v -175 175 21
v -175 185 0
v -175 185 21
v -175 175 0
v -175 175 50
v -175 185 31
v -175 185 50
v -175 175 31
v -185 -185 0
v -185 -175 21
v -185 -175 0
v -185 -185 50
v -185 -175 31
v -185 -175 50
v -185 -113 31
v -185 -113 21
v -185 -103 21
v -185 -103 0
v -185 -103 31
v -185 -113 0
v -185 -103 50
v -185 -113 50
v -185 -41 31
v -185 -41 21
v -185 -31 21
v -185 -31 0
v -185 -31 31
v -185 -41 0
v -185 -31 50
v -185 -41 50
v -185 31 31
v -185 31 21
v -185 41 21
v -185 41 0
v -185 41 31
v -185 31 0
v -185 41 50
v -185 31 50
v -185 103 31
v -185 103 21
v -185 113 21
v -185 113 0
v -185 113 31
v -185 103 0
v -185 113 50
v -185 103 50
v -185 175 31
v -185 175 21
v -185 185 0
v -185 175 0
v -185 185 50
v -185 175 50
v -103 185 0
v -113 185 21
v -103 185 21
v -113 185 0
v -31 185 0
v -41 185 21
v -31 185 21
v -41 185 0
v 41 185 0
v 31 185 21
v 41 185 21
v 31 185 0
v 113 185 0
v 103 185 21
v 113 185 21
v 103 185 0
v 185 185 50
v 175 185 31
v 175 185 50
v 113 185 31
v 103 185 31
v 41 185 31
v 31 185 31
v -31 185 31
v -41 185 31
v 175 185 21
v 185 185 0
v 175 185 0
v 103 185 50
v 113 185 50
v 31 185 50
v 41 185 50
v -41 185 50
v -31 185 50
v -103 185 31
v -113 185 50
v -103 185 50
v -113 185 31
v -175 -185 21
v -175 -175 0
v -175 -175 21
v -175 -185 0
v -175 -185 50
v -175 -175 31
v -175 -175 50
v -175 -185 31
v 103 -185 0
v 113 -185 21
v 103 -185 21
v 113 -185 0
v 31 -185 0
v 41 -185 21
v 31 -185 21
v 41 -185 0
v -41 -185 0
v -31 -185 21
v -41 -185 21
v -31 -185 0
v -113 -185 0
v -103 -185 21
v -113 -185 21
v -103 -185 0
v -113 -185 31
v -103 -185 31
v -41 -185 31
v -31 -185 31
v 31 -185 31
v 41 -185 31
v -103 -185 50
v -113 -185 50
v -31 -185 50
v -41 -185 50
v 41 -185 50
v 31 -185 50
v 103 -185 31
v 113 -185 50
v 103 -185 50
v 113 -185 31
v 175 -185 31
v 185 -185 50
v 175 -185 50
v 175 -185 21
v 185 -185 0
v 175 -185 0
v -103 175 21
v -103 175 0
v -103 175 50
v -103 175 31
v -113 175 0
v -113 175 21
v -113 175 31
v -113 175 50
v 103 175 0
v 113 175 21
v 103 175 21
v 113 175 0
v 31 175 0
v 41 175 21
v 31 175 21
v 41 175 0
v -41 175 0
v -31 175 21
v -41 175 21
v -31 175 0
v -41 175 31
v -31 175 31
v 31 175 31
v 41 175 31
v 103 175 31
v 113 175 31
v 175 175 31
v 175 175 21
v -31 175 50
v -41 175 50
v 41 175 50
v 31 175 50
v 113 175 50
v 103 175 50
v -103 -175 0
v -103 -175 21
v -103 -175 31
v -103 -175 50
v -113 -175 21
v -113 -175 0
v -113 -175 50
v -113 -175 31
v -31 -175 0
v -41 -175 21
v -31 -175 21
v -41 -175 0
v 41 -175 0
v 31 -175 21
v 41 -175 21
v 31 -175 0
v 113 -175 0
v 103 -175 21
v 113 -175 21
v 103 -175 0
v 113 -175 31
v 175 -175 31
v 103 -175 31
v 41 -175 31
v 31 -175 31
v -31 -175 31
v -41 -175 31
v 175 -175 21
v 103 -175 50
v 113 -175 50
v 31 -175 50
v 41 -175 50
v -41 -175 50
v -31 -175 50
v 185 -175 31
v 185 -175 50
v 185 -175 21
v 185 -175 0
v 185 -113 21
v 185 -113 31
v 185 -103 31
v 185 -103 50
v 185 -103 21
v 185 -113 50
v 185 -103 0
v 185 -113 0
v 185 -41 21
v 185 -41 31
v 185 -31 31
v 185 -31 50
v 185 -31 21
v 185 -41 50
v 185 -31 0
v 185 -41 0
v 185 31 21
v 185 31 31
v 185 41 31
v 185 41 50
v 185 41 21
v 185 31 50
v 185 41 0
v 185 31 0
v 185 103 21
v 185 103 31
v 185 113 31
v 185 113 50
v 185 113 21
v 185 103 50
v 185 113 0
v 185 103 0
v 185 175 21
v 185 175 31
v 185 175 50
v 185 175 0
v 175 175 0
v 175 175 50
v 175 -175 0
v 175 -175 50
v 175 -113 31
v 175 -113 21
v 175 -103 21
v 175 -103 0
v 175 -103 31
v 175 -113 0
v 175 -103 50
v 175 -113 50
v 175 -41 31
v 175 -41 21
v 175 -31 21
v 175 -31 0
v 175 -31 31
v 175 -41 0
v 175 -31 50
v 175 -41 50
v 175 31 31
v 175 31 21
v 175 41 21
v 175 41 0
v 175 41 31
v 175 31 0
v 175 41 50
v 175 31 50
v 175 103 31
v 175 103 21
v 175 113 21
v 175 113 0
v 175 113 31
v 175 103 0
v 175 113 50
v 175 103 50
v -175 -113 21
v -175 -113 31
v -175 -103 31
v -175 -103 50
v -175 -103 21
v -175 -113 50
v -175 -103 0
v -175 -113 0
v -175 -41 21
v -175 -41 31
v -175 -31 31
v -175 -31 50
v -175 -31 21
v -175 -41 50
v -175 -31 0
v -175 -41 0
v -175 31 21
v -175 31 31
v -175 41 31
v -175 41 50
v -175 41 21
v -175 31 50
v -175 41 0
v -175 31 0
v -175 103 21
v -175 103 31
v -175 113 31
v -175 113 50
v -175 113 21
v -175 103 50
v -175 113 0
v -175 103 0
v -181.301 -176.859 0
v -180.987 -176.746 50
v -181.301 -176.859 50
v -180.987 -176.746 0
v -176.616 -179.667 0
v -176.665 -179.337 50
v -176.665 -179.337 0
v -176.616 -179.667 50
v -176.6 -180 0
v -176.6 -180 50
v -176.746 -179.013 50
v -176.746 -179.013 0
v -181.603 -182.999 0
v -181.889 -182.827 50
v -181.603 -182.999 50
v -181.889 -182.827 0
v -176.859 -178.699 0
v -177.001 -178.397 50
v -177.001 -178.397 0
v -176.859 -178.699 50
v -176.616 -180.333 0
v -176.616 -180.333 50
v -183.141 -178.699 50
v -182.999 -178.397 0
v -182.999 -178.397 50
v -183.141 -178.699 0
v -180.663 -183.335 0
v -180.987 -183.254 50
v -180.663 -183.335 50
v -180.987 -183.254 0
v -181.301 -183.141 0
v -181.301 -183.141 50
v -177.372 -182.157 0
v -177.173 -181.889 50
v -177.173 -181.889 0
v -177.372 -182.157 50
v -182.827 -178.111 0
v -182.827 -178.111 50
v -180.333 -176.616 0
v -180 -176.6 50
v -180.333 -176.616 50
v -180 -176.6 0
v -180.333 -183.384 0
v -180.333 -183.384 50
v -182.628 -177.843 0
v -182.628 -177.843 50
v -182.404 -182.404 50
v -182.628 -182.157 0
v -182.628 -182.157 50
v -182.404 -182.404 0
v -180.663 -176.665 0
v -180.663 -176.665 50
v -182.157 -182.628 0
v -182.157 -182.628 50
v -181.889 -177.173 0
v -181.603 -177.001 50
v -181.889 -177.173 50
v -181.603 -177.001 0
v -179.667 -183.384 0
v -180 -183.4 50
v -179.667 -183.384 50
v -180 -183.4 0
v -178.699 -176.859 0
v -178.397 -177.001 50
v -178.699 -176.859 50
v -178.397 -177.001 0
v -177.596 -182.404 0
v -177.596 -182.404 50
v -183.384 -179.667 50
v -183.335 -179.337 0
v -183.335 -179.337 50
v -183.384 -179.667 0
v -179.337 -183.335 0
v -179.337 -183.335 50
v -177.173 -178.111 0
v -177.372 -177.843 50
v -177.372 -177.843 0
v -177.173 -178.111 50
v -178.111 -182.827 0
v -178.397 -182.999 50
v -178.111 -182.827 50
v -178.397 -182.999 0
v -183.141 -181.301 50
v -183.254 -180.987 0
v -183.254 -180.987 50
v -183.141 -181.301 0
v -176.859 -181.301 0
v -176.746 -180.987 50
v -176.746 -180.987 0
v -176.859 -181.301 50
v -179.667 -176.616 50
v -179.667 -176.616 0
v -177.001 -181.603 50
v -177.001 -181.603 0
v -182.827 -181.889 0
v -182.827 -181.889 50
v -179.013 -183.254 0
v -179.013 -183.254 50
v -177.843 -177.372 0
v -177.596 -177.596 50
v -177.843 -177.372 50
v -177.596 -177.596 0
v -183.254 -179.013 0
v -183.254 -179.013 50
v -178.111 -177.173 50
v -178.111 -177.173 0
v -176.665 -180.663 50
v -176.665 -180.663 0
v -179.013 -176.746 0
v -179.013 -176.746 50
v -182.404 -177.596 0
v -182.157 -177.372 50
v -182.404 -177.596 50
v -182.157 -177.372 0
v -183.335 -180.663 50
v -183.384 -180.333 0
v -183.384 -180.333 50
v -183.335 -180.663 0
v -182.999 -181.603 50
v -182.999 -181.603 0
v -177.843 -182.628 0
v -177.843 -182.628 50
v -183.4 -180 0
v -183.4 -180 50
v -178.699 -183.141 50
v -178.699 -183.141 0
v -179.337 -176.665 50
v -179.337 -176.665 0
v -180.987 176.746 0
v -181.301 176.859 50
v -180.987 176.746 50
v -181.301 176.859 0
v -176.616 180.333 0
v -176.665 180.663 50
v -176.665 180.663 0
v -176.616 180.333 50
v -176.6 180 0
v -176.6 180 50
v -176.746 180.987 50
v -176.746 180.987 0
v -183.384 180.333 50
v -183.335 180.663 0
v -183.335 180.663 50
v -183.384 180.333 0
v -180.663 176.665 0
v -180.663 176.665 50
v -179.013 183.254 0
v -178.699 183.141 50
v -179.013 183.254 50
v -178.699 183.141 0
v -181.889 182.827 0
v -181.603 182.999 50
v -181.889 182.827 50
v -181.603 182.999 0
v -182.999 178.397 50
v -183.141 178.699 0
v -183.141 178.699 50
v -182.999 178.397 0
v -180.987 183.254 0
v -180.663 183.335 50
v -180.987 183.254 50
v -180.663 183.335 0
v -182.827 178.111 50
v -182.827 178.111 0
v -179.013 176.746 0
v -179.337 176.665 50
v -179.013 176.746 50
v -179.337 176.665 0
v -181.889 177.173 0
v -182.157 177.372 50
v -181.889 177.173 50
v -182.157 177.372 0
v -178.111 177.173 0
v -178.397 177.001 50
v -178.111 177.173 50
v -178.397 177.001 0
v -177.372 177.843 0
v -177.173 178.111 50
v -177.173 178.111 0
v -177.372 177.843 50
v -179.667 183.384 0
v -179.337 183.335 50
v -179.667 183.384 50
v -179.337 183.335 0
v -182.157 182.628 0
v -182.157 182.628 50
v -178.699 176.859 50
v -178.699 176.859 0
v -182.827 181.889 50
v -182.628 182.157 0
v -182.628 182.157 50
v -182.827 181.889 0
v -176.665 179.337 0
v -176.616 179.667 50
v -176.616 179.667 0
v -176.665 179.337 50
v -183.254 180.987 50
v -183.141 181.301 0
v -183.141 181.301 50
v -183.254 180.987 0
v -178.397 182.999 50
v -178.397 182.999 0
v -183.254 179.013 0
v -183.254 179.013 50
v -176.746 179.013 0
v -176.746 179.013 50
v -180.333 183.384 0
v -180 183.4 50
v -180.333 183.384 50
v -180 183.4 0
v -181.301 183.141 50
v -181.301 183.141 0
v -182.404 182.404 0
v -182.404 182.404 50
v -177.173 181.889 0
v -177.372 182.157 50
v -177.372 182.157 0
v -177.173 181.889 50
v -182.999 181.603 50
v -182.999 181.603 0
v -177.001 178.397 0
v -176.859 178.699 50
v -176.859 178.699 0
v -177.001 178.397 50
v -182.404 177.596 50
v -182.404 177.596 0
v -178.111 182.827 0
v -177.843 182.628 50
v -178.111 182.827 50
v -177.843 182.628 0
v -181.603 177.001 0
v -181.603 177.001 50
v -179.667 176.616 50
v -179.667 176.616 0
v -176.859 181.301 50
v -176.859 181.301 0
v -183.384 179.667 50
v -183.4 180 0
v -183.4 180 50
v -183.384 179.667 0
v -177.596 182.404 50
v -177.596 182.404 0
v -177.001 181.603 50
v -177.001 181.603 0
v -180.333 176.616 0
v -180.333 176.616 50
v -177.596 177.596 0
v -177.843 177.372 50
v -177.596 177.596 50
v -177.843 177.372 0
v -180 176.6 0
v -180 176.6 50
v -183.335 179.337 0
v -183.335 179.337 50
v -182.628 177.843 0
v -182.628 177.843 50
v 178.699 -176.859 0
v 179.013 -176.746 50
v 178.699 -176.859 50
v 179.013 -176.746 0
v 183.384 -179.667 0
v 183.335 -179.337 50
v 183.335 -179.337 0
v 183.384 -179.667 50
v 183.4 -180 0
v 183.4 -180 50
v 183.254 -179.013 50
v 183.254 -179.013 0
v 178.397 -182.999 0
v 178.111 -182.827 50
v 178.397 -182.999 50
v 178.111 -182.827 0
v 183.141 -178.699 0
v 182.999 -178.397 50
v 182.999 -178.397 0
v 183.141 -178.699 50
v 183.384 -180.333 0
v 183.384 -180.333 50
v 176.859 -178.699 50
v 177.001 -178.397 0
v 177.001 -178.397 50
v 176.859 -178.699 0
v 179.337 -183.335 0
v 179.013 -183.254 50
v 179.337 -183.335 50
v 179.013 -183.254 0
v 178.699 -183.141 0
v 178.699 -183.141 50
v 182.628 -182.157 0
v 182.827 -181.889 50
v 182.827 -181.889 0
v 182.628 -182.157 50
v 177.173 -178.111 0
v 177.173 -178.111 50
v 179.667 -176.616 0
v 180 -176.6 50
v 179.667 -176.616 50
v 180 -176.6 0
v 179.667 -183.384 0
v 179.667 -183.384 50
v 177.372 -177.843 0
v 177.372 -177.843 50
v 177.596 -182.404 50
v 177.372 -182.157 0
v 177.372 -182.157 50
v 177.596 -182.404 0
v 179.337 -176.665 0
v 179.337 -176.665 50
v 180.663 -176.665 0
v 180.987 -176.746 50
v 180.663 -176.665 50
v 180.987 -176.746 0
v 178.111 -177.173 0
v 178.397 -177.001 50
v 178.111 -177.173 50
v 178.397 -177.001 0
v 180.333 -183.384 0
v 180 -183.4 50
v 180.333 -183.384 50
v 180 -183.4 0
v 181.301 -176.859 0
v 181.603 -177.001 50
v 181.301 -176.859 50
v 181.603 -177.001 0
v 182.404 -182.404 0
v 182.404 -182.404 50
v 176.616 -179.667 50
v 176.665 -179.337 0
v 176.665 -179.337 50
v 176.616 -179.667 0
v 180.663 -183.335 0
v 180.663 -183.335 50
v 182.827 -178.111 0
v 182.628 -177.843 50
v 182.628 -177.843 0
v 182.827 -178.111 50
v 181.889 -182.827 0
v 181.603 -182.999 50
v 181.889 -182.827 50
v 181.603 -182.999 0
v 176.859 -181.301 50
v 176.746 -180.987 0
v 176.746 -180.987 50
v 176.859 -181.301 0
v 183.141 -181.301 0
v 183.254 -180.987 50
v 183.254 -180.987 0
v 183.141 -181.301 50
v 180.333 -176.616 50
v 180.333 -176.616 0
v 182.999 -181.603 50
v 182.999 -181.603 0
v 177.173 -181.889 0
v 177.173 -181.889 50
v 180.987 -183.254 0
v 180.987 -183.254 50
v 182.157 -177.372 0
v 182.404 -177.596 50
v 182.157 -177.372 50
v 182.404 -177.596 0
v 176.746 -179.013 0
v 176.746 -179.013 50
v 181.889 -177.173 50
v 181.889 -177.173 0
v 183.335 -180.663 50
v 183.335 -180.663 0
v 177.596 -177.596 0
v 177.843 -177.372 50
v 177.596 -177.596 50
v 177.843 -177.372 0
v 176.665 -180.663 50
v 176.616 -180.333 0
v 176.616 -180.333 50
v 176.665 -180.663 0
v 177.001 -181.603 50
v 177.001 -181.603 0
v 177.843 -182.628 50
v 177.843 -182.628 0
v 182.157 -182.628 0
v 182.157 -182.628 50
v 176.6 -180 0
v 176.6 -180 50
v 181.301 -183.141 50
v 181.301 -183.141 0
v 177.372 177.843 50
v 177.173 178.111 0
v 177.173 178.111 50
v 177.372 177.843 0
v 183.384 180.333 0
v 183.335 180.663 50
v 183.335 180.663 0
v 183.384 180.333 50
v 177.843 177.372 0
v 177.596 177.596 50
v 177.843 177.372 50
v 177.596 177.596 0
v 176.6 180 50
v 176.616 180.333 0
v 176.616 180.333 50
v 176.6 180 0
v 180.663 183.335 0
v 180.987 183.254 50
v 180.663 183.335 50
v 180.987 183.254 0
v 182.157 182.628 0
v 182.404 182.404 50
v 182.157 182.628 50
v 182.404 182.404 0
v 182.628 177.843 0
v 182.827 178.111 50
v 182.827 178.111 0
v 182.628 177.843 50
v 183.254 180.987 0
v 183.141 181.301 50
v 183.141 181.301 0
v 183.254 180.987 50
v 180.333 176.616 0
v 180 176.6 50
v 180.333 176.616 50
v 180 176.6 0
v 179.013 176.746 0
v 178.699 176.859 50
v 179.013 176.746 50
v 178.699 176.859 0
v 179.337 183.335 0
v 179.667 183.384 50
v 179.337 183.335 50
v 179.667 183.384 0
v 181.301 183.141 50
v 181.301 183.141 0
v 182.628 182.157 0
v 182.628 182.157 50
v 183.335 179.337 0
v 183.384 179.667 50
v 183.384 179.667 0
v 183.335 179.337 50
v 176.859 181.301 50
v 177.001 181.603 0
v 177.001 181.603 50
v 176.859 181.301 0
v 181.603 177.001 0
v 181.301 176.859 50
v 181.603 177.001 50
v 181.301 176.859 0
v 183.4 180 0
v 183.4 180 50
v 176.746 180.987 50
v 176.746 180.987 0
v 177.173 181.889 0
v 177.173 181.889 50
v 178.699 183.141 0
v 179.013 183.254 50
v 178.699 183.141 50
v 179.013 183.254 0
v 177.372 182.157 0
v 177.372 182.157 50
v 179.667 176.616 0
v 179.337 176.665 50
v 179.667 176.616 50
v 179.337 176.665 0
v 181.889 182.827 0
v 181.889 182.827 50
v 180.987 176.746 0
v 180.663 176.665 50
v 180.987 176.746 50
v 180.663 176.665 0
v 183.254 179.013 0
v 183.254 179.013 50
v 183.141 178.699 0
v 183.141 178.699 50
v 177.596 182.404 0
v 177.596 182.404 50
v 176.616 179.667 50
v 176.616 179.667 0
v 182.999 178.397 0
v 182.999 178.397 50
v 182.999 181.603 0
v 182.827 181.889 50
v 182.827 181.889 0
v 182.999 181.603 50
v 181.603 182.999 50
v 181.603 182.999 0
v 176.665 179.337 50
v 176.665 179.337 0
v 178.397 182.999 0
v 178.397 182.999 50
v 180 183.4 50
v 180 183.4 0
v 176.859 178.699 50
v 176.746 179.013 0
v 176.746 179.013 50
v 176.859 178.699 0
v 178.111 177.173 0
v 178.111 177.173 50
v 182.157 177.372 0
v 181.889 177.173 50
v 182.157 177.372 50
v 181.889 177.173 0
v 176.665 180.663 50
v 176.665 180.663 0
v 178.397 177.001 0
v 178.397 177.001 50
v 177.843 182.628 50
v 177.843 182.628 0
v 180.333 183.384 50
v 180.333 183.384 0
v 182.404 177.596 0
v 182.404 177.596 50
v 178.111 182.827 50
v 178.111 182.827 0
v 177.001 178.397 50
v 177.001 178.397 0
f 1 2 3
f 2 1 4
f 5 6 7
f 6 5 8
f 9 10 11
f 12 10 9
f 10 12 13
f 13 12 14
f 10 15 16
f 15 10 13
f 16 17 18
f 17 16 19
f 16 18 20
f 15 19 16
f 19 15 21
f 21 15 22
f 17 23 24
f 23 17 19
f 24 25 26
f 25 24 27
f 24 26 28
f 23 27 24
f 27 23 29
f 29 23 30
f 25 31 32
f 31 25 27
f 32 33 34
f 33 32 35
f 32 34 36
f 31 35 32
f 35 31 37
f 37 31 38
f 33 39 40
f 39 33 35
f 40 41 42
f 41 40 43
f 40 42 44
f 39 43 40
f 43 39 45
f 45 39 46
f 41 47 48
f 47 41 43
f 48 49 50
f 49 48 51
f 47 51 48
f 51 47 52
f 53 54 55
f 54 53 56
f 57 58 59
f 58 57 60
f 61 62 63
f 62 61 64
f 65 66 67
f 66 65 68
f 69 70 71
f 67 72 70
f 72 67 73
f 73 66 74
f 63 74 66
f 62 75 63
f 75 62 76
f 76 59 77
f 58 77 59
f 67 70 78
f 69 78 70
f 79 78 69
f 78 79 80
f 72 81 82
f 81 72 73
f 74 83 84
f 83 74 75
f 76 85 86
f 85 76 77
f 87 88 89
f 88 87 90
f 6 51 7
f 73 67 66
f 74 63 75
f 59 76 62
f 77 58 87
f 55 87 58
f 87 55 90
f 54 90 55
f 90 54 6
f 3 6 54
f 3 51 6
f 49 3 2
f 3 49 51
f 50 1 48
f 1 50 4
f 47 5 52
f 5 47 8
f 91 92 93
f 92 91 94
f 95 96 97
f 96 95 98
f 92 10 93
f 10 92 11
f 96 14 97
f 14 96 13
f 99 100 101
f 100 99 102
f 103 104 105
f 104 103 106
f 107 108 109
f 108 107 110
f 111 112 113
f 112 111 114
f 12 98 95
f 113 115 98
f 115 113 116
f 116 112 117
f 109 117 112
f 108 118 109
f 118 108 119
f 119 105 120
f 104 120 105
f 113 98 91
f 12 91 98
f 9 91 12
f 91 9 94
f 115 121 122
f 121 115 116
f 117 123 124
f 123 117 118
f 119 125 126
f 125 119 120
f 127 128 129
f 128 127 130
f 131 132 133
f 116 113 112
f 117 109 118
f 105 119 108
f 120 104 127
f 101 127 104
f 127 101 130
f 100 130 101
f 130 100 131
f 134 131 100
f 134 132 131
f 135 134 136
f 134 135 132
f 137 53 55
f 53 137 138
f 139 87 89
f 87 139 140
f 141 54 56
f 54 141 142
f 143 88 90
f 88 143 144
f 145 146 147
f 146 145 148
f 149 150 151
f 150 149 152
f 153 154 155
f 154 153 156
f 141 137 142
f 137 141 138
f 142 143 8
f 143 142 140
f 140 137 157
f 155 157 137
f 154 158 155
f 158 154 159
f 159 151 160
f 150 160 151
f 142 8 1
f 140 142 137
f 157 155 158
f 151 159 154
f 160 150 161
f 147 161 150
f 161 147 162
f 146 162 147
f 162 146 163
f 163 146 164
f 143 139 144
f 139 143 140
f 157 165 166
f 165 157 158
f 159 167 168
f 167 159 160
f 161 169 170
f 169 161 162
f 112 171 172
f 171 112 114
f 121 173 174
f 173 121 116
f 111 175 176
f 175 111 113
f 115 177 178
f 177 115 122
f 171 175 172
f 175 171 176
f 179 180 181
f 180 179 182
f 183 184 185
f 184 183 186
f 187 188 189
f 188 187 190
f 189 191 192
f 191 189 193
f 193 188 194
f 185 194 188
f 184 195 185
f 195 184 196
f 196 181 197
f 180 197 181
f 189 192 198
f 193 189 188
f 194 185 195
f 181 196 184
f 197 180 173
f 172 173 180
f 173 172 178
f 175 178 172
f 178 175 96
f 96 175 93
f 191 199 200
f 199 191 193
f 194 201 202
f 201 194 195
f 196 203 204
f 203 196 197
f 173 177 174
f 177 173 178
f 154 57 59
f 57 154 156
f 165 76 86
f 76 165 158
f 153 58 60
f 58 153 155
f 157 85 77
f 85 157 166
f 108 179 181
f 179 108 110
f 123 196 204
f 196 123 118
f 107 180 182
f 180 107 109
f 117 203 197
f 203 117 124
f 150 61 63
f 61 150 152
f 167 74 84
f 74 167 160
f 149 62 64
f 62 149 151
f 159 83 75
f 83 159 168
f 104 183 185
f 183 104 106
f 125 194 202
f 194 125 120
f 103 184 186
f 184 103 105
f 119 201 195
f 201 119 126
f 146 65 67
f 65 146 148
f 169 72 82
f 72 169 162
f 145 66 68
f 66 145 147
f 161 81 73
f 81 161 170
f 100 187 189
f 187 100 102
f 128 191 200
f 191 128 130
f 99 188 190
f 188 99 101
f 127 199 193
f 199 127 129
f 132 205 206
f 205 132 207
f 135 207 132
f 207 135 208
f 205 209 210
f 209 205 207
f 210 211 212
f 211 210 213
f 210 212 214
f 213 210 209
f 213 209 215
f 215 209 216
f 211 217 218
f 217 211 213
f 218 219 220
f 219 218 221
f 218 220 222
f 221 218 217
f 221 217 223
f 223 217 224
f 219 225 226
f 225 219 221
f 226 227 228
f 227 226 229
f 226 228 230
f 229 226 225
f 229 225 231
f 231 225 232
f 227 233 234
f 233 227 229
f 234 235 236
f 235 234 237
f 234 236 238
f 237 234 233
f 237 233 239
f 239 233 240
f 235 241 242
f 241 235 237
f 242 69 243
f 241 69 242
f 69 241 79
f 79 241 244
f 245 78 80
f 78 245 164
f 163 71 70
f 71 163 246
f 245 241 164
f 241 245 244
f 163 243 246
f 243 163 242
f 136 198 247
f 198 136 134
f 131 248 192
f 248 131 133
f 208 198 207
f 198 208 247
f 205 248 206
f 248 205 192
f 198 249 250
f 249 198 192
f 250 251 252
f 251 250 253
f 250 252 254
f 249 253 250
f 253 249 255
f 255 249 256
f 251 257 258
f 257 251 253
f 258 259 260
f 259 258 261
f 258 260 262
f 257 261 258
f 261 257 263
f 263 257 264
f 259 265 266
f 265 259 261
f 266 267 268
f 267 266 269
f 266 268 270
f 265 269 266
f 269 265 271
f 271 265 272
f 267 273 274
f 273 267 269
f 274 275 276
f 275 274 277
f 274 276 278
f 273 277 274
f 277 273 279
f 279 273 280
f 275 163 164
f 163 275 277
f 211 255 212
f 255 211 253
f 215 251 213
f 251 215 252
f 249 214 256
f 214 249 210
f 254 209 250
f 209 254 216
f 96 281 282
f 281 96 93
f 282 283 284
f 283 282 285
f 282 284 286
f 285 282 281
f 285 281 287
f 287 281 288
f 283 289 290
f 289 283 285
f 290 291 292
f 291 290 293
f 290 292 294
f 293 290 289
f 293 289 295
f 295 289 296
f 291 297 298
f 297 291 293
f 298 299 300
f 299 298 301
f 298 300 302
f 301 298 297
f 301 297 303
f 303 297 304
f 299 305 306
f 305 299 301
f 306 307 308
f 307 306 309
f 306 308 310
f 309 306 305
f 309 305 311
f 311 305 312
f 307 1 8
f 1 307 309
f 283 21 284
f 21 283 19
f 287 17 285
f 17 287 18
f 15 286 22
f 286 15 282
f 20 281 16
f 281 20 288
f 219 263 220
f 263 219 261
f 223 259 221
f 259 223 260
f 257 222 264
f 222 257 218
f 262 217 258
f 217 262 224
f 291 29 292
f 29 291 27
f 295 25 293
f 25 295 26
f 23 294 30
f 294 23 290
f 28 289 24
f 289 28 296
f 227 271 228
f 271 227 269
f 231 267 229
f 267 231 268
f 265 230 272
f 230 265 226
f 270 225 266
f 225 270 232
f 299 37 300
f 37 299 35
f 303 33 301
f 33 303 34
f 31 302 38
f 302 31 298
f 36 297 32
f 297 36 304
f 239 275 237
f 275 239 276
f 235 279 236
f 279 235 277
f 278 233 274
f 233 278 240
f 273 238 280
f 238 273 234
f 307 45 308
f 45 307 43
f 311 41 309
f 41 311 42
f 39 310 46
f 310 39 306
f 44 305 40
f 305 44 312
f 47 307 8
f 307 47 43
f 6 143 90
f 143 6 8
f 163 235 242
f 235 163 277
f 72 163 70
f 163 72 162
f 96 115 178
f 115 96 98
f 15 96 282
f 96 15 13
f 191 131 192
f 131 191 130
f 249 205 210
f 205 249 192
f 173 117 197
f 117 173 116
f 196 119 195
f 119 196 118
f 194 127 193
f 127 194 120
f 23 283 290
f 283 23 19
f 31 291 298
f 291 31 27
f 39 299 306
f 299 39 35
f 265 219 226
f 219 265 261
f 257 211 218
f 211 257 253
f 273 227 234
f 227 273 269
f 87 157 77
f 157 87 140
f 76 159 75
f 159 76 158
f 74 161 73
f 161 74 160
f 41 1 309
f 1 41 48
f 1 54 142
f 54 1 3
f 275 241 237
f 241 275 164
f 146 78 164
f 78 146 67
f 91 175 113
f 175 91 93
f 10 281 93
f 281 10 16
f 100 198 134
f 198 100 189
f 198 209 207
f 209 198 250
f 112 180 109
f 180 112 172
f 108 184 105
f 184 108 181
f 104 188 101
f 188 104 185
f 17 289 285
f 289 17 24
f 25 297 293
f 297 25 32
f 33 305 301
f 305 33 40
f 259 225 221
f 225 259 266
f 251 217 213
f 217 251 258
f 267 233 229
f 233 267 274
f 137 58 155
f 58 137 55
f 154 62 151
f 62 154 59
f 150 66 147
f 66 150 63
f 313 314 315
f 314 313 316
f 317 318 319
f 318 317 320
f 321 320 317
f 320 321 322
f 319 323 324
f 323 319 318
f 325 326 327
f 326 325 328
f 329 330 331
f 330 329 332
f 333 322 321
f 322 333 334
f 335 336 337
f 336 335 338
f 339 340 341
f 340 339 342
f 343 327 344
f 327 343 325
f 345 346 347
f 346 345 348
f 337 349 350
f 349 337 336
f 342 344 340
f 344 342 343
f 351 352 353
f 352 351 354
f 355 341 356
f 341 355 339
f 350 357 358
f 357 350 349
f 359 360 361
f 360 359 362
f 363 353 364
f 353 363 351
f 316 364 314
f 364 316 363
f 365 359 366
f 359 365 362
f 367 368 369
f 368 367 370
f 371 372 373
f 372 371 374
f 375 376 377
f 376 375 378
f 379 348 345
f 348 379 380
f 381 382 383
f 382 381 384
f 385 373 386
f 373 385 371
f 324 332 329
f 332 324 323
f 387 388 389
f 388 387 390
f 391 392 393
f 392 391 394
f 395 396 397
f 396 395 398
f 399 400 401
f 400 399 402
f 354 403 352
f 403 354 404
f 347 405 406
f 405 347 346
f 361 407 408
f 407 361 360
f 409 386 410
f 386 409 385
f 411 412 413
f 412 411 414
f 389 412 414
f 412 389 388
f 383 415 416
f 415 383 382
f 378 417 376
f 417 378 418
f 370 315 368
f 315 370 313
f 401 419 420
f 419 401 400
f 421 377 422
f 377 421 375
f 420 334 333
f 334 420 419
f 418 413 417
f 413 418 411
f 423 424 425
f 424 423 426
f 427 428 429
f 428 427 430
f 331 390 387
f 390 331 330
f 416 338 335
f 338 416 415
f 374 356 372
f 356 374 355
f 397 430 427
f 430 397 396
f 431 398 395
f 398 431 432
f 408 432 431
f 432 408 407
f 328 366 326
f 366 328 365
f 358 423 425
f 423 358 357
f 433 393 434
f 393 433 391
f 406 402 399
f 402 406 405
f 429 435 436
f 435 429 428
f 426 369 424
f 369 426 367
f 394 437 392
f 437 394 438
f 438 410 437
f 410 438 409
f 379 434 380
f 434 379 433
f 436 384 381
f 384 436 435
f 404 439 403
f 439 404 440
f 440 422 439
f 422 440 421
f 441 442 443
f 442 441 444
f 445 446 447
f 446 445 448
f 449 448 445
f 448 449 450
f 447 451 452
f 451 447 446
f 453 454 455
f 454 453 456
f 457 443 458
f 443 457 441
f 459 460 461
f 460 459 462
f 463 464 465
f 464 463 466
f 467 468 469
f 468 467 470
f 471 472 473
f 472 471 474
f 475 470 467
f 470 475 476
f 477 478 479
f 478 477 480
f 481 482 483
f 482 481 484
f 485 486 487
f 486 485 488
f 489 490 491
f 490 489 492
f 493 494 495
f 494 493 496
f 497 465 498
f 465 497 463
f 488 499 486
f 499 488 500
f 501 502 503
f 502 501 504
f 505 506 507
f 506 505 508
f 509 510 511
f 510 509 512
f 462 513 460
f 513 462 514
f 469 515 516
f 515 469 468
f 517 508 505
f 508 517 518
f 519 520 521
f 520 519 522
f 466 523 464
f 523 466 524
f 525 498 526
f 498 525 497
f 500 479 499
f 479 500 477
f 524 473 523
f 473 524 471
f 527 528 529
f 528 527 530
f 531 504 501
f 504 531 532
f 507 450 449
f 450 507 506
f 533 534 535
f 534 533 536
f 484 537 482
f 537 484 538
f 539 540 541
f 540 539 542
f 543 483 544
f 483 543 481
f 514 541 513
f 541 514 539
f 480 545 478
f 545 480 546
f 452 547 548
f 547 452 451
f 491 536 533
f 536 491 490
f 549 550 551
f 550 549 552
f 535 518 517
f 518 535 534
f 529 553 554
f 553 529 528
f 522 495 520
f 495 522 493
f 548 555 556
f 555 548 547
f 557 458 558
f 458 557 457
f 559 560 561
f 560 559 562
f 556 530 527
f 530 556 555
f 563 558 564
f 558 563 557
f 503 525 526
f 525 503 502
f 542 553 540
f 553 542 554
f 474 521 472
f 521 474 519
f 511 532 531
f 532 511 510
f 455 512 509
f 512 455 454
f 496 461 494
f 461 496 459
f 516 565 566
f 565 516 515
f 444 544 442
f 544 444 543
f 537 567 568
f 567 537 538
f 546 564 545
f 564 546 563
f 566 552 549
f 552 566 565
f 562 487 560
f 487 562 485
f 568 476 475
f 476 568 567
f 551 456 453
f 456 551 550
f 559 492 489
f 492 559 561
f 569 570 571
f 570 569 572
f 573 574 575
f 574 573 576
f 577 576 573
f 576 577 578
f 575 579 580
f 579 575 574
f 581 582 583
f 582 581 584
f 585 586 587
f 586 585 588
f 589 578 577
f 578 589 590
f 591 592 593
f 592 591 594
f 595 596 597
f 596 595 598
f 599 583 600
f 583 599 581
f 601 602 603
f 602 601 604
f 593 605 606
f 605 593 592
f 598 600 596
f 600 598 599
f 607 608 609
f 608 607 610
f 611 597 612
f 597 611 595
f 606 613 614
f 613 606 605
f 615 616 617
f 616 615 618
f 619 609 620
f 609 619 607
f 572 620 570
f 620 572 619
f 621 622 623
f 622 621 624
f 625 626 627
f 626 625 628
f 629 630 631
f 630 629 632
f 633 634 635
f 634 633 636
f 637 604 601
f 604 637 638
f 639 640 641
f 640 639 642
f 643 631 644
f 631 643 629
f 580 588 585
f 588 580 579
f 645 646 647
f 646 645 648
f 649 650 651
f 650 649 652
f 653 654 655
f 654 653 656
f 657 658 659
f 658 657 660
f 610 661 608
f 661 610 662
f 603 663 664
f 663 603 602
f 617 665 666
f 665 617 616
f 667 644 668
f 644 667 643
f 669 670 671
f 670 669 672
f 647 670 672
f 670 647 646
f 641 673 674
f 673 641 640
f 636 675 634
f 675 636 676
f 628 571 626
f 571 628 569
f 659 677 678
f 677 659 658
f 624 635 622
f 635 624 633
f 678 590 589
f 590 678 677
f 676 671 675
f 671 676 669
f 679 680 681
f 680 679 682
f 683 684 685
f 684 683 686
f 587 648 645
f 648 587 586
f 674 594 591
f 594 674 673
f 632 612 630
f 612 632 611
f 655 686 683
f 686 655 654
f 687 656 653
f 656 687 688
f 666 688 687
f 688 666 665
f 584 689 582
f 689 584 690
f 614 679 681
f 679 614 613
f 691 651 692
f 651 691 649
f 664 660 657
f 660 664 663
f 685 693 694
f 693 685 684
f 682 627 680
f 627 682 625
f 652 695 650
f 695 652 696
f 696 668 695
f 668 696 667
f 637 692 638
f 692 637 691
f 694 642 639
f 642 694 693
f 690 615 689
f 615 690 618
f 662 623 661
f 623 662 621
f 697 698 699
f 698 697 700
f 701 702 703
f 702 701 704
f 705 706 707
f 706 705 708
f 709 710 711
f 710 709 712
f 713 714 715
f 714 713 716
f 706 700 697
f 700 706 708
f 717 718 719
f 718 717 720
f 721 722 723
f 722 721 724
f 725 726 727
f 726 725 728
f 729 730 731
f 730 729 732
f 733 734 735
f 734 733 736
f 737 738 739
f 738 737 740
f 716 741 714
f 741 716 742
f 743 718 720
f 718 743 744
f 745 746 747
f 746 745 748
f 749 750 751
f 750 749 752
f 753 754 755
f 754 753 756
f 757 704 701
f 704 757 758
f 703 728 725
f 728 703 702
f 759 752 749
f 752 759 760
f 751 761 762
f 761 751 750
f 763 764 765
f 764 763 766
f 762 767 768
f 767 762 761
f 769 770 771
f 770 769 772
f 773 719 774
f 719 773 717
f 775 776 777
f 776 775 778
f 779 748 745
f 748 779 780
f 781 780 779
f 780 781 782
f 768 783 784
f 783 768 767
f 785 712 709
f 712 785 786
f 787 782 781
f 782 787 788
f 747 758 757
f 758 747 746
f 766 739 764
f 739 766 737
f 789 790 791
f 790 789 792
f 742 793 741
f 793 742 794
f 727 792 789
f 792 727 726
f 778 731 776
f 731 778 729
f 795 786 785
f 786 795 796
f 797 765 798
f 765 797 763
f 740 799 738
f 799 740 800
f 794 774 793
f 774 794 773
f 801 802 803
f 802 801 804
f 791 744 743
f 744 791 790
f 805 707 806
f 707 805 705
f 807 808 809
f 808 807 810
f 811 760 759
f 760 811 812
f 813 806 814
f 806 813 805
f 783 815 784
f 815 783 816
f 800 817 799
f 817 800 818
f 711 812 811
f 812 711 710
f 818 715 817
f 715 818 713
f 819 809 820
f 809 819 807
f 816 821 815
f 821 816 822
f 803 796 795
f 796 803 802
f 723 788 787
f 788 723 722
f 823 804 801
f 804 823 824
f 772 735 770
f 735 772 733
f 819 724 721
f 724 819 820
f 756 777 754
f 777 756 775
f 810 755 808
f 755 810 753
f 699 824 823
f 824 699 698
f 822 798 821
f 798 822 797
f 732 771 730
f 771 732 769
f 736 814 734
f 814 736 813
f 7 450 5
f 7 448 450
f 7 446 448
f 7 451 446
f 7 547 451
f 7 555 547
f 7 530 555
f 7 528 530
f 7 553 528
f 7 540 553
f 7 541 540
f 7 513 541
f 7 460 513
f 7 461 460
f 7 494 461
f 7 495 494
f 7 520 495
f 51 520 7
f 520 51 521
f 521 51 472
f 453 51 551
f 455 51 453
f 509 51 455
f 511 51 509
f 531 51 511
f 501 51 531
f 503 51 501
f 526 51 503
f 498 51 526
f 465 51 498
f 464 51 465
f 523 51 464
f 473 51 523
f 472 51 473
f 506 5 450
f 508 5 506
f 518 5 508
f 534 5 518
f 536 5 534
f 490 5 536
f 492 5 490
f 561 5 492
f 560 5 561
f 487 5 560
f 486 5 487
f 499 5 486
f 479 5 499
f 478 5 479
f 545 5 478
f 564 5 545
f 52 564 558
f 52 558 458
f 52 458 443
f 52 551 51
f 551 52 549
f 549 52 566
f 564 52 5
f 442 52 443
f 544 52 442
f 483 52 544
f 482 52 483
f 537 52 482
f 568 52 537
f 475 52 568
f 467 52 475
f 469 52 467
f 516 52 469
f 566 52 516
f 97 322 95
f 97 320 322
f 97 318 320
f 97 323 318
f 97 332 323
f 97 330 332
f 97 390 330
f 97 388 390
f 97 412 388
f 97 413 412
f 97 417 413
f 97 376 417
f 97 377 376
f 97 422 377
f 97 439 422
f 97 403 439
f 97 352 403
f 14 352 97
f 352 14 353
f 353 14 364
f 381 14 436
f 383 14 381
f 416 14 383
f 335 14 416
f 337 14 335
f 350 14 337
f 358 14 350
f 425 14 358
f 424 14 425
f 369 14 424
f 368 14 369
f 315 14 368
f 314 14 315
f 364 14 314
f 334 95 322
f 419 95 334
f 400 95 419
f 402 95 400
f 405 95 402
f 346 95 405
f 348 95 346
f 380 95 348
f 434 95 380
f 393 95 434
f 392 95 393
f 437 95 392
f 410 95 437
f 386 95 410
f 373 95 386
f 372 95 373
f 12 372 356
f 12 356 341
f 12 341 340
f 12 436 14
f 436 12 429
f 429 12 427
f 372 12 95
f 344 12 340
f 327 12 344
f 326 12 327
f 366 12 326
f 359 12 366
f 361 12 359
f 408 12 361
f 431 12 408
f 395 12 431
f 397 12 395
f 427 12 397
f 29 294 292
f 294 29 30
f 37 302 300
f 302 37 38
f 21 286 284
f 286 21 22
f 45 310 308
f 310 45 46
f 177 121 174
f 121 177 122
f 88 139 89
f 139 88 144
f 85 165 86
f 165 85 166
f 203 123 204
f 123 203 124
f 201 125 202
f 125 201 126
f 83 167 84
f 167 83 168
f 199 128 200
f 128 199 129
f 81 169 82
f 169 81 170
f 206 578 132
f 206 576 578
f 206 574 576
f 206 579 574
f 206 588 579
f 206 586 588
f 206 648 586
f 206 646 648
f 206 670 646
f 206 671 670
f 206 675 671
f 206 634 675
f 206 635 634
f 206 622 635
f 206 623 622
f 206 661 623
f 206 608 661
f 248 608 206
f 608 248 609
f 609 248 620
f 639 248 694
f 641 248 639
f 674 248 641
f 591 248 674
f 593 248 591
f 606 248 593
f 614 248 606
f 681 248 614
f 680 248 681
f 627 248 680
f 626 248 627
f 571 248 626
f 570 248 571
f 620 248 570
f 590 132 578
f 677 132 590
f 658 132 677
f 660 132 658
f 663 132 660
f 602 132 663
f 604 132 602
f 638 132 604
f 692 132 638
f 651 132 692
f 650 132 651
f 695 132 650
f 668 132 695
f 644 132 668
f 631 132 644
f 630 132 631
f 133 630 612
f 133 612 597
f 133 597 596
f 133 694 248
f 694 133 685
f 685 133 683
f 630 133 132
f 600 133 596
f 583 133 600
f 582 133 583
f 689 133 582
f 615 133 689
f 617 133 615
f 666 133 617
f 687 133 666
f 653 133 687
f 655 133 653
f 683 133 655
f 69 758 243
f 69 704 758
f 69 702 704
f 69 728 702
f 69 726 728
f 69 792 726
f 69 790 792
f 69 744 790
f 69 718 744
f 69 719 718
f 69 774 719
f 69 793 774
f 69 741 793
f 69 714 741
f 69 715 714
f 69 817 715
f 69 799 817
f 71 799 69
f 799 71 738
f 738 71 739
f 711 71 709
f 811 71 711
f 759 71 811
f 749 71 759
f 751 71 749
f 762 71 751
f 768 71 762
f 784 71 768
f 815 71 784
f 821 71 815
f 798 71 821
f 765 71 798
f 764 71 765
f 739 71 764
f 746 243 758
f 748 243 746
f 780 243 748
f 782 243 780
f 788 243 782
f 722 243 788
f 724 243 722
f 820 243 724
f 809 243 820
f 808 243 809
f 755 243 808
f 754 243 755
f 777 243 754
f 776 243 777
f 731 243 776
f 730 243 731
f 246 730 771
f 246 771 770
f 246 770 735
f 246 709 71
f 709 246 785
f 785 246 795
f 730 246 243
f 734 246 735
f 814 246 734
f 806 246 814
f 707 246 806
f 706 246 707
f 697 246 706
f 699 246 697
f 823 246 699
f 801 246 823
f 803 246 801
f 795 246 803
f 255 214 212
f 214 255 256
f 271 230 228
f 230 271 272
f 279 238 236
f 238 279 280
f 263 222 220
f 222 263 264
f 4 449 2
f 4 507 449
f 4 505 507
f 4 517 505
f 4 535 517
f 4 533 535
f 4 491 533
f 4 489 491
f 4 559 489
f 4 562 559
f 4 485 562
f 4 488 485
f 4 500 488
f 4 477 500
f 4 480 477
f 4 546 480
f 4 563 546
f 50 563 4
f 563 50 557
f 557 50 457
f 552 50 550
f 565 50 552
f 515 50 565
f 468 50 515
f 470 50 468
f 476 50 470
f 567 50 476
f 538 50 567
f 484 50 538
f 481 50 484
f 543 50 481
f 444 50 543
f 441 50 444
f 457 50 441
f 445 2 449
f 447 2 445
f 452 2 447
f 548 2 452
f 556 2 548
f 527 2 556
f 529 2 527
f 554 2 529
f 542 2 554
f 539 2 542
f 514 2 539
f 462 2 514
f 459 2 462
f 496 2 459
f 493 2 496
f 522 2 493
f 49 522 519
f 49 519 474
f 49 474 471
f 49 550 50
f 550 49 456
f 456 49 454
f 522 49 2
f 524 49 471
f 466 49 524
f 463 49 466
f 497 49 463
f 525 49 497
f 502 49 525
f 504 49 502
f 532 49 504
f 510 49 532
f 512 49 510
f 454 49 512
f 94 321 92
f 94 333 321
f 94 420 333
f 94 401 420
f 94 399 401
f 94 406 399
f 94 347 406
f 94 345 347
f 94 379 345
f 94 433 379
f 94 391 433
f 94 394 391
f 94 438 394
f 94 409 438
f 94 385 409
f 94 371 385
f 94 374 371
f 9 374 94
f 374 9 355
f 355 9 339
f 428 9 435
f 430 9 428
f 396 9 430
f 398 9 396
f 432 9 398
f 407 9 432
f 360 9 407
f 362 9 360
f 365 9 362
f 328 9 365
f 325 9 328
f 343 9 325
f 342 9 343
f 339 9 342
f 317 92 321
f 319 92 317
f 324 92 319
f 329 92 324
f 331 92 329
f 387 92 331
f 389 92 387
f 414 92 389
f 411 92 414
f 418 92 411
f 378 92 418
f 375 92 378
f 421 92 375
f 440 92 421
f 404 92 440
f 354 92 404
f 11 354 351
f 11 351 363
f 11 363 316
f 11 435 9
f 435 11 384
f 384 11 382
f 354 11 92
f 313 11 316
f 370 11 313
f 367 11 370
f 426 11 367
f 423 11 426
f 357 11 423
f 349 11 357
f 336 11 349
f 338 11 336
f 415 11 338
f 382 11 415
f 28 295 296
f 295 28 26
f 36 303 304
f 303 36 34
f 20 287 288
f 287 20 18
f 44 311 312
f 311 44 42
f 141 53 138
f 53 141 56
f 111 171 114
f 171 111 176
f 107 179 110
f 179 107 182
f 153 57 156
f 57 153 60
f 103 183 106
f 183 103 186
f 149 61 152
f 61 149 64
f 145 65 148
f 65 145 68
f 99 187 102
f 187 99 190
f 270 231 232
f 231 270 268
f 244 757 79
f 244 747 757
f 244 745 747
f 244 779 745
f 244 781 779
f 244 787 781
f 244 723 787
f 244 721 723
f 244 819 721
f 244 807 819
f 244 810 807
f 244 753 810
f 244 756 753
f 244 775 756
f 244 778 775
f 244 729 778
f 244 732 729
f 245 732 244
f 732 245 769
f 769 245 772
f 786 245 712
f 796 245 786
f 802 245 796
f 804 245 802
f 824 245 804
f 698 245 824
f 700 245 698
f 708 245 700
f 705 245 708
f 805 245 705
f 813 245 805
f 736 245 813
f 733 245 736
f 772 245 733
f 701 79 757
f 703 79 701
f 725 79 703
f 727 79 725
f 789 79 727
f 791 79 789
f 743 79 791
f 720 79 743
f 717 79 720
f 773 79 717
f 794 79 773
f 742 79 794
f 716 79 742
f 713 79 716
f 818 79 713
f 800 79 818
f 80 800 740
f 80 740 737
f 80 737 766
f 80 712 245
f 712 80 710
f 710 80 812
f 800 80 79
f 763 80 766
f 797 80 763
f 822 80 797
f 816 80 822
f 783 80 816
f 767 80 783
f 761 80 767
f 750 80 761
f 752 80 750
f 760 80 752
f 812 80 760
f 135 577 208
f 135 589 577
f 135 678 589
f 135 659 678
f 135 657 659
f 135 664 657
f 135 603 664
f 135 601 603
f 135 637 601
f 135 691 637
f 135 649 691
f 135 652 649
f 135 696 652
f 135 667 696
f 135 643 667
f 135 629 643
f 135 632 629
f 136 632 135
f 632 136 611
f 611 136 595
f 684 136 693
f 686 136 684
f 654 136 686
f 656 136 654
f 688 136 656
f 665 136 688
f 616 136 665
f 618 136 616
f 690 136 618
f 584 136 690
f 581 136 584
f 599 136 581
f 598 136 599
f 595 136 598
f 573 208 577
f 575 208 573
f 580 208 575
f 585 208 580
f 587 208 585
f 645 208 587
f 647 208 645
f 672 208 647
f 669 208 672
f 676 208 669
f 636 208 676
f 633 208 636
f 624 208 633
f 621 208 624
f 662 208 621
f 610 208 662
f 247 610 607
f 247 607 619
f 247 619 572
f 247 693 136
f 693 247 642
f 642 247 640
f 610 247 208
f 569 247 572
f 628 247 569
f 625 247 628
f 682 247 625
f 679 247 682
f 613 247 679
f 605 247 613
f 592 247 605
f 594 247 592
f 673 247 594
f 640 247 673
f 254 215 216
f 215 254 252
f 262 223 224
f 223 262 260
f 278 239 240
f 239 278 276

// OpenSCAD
// Cage slice part (z0..z1). Units: mm.
// Print orientation: normal

bar=10;
inner=[350,350,700];
gap_xy=62;
gap_z=61;
hole_d=6.8;
$fn=64;

outer=[inner[0]+2*bar, inner[1]+2*bar, inner[2]+2*bar];
half=[outer[0]/2, outer[1]/2, outer[2]/2];

pitch_xy=bar+gap_xy;
pitch_z=bar+gap_z;

centers=[for(i=[0:5]) -(half[0]-bar/2) + i*pitch_xy];
z_levels=[for(i=[0:10]) i*pitch_z];

module vbar(xc,yc){ translate([xc-bar/2,yc-bar/2,0]) cube([bar,bar,outer[2]],center=false); }
module hbar_x(yc,z0){ translate([-half[0],yc-bar/2,z0]) cube([outer[0],bar,bar],center=false); }
module hbar_y(xc,z0){ translate([xc-bar/2,-half[1],z0]) cube([bar,outer[1],bar],center=false); }

module grid(z0){ union(){ for(yc=centers) hbar_x(yc,z0); for(xc=centers) hbar_y(xc,z0); } }

module side_verticals(){
  union(){
    for(xc=centers){ vbar(xc, half[1]-bar/2); vbar(xc,-half[1]+bar/2); }
    for(yc=centers){ vbar( half[0]-bar/2,yc); vbar(-half[0]+bar/2,yc); }
  }
}

module side_rings(){
  union(){
    for(z0=z_levels){
      hbar_x( half[1]-bar/2,z0); hbar_x(-half[1]+bar/2,z0);
      hbar_y( half[0]-bar/2,z0); hbar_y(-half[0]+bar/2,z0);
    }
  }
}

module rod_holes(){
  for(sx=[-1,1],sy=[-1,1]) translate([sx*(half[0]-bar/2), sy*(half[1]-bar/2), -1]) cylinder(d=hole_d,h=outer[2]+2,center=false);
}

module cage(){ difference(){ union(){ side_verticals(); side_rings(); grid(0); grid(outer[2]-bar); } rod_holes(); } }

module cage_slice(zmin,zmax){ intersection(){ cage(); translate([-1000,-1000,zmin]) cube([2000,2000,zmax-zmin],center=false); } }

z0=50; z1=100;
translate([0,0,-z0]) cage_slice(z0,z1);
